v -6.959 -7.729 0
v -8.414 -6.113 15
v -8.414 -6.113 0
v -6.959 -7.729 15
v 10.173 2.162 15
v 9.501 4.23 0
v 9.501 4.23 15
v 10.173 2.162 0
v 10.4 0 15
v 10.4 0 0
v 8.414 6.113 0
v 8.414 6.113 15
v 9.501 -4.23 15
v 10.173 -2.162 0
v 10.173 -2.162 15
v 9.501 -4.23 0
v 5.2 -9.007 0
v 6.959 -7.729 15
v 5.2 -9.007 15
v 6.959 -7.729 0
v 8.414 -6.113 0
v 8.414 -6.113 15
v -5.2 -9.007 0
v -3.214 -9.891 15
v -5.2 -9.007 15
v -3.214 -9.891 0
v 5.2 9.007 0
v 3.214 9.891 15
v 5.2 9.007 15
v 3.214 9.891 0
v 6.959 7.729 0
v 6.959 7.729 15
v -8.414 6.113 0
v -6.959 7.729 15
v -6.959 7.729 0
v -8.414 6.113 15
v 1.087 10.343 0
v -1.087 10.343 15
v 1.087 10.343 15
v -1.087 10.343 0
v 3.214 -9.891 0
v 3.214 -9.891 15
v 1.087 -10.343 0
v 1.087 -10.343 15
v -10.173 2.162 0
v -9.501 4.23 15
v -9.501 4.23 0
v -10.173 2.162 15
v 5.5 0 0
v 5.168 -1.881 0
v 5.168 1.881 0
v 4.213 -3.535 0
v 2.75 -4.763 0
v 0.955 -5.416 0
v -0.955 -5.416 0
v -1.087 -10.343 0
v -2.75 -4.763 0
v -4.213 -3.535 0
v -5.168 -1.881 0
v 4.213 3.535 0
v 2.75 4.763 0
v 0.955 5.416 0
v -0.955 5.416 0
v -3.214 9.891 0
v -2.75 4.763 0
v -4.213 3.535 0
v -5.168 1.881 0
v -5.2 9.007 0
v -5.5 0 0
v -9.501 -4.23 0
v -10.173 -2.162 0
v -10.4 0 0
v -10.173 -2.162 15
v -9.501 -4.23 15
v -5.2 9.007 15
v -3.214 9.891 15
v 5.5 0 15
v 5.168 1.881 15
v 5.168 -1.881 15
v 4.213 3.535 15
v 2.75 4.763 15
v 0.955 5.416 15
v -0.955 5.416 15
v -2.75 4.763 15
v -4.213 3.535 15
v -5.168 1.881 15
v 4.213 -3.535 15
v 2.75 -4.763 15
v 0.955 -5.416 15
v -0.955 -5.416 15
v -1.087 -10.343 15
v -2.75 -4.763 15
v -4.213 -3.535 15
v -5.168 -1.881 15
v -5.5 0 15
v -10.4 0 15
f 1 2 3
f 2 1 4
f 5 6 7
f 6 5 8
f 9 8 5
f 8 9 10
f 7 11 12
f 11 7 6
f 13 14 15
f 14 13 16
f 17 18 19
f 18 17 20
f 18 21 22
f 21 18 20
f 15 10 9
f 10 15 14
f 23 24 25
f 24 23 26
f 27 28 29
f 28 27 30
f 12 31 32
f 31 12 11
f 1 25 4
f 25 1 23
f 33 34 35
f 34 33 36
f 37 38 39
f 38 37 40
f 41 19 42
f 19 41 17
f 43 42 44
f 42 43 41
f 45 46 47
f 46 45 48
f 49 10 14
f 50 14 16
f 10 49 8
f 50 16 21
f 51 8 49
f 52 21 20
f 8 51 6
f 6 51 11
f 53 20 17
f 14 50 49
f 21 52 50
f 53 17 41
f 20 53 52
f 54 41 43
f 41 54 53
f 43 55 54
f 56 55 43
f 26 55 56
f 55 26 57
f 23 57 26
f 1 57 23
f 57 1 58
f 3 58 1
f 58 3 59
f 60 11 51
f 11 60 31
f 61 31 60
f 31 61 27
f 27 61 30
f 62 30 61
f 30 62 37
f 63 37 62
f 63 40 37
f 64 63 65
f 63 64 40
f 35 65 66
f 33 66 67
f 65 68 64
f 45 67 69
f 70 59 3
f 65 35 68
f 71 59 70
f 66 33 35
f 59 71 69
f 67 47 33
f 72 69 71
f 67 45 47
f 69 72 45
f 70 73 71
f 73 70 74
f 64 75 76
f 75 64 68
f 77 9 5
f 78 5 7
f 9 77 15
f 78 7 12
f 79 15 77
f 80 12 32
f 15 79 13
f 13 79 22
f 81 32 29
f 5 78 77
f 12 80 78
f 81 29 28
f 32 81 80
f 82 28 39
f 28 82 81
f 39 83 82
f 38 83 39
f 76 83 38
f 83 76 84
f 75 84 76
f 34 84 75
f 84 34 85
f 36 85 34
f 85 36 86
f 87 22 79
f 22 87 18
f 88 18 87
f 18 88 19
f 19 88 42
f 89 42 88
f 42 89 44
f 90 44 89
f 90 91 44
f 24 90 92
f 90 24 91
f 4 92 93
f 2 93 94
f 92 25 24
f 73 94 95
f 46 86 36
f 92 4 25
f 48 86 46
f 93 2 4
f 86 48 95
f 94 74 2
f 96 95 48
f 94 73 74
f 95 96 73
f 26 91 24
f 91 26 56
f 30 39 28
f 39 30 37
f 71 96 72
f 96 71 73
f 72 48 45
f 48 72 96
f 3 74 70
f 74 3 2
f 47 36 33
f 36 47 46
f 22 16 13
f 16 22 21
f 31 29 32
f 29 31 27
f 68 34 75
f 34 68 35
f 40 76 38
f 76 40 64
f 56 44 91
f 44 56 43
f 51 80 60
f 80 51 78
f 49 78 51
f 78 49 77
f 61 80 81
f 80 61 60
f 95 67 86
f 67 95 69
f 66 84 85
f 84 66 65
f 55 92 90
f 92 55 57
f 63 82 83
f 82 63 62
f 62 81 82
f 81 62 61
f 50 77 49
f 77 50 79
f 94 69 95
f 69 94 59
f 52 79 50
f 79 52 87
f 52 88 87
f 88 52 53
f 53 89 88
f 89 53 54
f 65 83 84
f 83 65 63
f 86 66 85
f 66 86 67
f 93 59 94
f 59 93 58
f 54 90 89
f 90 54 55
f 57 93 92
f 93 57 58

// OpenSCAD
end_inner_diameter = 10.5;
end_inner_radius = 5.5;
end_length = 15;

difference() {
    cylinder(h = end_length, r = end_inner_diameter - 0.1);
    cylinder(h = end_length + 1, r = end_inner_radius);
}
